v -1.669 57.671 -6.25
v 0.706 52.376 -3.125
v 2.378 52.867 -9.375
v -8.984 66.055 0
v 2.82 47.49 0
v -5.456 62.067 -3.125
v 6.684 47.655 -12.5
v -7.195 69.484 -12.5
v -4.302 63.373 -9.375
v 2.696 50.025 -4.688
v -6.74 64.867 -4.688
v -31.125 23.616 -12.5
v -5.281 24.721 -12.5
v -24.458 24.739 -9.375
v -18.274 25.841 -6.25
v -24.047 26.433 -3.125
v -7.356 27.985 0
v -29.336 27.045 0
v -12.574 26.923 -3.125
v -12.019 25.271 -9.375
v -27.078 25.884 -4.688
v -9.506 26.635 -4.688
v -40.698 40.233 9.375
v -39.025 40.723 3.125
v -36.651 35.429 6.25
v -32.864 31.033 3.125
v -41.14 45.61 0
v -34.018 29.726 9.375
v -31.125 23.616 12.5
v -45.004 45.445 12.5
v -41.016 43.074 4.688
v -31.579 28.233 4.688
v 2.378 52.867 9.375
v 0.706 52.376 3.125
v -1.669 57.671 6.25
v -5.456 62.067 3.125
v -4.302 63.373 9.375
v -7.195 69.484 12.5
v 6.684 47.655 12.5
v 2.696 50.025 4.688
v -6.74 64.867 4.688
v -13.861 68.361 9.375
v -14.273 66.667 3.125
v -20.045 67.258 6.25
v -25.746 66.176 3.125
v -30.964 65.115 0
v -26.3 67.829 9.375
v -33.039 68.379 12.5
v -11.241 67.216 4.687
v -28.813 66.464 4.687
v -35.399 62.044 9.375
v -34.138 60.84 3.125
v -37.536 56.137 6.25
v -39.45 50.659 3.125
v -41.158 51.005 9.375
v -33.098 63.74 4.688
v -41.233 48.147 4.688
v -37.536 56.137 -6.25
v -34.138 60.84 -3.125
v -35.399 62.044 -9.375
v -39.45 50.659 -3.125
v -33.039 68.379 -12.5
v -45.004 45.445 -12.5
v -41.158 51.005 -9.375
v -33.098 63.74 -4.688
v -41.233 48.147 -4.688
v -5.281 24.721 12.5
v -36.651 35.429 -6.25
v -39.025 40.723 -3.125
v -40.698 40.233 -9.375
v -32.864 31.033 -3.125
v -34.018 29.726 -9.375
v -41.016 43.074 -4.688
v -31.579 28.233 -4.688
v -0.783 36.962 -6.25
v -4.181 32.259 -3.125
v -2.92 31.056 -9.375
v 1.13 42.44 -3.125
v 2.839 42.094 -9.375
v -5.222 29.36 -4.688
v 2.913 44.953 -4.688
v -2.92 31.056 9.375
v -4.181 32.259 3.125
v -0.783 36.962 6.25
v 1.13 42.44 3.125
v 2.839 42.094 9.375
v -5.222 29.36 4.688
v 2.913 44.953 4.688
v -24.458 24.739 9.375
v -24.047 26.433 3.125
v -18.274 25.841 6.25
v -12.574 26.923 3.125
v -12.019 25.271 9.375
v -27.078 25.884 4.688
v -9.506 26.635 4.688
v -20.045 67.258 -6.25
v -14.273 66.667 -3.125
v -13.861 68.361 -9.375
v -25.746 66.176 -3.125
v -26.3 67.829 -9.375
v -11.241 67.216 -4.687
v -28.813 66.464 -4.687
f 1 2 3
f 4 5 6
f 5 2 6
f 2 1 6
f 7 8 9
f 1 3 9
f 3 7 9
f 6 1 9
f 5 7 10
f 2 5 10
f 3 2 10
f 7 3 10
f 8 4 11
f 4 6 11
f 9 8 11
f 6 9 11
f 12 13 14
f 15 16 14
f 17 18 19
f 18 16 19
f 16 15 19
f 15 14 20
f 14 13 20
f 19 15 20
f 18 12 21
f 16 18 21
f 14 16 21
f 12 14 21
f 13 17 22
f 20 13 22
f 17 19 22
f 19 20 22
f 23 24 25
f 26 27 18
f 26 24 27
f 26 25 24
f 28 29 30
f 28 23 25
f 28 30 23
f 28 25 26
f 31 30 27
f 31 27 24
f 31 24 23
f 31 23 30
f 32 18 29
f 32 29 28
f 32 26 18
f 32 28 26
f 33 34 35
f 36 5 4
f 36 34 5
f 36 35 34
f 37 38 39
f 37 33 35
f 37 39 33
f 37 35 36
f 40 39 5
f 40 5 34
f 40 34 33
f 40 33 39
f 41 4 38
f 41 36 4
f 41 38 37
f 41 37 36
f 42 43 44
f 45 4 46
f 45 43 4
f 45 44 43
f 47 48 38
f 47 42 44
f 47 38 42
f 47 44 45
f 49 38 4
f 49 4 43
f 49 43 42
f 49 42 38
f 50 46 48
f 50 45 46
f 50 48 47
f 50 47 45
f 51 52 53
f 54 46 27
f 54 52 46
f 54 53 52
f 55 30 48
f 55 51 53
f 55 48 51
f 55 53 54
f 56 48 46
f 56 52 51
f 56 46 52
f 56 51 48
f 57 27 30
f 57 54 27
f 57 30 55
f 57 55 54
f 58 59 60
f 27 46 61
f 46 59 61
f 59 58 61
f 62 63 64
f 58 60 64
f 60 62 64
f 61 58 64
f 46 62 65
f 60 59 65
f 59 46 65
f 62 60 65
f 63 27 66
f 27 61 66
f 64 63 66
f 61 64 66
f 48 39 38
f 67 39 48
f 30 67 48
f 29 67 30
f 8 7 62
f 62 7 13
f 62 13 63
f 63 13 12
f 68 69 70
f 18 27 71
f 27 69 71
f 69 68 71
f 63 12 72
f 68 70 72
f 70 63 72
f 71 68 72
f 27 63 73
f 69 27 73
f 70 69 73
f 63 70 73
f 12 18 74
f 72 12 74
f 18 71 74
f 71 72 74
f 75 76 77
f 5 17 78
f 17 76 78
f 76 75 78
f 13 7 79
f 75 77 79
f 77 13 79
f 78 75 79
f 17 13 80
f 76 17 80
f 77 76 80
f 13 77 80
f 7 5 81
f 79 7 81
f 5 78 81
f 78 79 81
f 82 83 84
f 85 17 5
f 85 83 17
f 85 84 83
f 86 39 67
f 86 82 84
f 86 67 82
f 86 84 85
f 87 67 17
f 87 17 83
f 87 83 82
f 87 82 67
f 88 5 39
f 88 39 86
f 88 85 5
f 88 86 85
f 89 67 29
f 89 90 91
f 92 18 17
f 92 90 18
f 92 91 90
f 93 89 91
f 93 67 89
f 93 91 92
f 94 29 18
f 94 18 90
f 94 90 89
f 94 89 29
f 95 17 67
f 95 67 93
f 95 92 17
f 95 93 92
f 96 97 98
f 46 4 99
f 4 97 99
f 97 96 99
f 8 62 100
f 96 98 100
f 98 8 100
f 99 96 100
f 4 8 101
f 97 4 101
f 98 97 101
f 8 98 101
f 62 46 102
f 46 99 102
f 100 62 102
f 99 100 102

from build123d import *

# Parameters (mm, degrees)
F1_DEPTH = 12.5
F1_TAPER = -15


with BuildPart() as f1:
    # F0 (on Top) → F1 (new body, symmetric)
    with BuildSketch(Plane.XY):
        Polygon((2.8201816698, 47.4896142352), (-8.9836634141, 66.0548839945), (-30.9635811957, 65.1150891691), (-41.1396538934, 45.6100245845), (-29.3358088095, 27.0447548252), (-7.3558910279, 27.9845496506), align=None)
    extrude(amount=F1_DEPTH, both=True, taper=F1_TAPER)


solid = f1.part
